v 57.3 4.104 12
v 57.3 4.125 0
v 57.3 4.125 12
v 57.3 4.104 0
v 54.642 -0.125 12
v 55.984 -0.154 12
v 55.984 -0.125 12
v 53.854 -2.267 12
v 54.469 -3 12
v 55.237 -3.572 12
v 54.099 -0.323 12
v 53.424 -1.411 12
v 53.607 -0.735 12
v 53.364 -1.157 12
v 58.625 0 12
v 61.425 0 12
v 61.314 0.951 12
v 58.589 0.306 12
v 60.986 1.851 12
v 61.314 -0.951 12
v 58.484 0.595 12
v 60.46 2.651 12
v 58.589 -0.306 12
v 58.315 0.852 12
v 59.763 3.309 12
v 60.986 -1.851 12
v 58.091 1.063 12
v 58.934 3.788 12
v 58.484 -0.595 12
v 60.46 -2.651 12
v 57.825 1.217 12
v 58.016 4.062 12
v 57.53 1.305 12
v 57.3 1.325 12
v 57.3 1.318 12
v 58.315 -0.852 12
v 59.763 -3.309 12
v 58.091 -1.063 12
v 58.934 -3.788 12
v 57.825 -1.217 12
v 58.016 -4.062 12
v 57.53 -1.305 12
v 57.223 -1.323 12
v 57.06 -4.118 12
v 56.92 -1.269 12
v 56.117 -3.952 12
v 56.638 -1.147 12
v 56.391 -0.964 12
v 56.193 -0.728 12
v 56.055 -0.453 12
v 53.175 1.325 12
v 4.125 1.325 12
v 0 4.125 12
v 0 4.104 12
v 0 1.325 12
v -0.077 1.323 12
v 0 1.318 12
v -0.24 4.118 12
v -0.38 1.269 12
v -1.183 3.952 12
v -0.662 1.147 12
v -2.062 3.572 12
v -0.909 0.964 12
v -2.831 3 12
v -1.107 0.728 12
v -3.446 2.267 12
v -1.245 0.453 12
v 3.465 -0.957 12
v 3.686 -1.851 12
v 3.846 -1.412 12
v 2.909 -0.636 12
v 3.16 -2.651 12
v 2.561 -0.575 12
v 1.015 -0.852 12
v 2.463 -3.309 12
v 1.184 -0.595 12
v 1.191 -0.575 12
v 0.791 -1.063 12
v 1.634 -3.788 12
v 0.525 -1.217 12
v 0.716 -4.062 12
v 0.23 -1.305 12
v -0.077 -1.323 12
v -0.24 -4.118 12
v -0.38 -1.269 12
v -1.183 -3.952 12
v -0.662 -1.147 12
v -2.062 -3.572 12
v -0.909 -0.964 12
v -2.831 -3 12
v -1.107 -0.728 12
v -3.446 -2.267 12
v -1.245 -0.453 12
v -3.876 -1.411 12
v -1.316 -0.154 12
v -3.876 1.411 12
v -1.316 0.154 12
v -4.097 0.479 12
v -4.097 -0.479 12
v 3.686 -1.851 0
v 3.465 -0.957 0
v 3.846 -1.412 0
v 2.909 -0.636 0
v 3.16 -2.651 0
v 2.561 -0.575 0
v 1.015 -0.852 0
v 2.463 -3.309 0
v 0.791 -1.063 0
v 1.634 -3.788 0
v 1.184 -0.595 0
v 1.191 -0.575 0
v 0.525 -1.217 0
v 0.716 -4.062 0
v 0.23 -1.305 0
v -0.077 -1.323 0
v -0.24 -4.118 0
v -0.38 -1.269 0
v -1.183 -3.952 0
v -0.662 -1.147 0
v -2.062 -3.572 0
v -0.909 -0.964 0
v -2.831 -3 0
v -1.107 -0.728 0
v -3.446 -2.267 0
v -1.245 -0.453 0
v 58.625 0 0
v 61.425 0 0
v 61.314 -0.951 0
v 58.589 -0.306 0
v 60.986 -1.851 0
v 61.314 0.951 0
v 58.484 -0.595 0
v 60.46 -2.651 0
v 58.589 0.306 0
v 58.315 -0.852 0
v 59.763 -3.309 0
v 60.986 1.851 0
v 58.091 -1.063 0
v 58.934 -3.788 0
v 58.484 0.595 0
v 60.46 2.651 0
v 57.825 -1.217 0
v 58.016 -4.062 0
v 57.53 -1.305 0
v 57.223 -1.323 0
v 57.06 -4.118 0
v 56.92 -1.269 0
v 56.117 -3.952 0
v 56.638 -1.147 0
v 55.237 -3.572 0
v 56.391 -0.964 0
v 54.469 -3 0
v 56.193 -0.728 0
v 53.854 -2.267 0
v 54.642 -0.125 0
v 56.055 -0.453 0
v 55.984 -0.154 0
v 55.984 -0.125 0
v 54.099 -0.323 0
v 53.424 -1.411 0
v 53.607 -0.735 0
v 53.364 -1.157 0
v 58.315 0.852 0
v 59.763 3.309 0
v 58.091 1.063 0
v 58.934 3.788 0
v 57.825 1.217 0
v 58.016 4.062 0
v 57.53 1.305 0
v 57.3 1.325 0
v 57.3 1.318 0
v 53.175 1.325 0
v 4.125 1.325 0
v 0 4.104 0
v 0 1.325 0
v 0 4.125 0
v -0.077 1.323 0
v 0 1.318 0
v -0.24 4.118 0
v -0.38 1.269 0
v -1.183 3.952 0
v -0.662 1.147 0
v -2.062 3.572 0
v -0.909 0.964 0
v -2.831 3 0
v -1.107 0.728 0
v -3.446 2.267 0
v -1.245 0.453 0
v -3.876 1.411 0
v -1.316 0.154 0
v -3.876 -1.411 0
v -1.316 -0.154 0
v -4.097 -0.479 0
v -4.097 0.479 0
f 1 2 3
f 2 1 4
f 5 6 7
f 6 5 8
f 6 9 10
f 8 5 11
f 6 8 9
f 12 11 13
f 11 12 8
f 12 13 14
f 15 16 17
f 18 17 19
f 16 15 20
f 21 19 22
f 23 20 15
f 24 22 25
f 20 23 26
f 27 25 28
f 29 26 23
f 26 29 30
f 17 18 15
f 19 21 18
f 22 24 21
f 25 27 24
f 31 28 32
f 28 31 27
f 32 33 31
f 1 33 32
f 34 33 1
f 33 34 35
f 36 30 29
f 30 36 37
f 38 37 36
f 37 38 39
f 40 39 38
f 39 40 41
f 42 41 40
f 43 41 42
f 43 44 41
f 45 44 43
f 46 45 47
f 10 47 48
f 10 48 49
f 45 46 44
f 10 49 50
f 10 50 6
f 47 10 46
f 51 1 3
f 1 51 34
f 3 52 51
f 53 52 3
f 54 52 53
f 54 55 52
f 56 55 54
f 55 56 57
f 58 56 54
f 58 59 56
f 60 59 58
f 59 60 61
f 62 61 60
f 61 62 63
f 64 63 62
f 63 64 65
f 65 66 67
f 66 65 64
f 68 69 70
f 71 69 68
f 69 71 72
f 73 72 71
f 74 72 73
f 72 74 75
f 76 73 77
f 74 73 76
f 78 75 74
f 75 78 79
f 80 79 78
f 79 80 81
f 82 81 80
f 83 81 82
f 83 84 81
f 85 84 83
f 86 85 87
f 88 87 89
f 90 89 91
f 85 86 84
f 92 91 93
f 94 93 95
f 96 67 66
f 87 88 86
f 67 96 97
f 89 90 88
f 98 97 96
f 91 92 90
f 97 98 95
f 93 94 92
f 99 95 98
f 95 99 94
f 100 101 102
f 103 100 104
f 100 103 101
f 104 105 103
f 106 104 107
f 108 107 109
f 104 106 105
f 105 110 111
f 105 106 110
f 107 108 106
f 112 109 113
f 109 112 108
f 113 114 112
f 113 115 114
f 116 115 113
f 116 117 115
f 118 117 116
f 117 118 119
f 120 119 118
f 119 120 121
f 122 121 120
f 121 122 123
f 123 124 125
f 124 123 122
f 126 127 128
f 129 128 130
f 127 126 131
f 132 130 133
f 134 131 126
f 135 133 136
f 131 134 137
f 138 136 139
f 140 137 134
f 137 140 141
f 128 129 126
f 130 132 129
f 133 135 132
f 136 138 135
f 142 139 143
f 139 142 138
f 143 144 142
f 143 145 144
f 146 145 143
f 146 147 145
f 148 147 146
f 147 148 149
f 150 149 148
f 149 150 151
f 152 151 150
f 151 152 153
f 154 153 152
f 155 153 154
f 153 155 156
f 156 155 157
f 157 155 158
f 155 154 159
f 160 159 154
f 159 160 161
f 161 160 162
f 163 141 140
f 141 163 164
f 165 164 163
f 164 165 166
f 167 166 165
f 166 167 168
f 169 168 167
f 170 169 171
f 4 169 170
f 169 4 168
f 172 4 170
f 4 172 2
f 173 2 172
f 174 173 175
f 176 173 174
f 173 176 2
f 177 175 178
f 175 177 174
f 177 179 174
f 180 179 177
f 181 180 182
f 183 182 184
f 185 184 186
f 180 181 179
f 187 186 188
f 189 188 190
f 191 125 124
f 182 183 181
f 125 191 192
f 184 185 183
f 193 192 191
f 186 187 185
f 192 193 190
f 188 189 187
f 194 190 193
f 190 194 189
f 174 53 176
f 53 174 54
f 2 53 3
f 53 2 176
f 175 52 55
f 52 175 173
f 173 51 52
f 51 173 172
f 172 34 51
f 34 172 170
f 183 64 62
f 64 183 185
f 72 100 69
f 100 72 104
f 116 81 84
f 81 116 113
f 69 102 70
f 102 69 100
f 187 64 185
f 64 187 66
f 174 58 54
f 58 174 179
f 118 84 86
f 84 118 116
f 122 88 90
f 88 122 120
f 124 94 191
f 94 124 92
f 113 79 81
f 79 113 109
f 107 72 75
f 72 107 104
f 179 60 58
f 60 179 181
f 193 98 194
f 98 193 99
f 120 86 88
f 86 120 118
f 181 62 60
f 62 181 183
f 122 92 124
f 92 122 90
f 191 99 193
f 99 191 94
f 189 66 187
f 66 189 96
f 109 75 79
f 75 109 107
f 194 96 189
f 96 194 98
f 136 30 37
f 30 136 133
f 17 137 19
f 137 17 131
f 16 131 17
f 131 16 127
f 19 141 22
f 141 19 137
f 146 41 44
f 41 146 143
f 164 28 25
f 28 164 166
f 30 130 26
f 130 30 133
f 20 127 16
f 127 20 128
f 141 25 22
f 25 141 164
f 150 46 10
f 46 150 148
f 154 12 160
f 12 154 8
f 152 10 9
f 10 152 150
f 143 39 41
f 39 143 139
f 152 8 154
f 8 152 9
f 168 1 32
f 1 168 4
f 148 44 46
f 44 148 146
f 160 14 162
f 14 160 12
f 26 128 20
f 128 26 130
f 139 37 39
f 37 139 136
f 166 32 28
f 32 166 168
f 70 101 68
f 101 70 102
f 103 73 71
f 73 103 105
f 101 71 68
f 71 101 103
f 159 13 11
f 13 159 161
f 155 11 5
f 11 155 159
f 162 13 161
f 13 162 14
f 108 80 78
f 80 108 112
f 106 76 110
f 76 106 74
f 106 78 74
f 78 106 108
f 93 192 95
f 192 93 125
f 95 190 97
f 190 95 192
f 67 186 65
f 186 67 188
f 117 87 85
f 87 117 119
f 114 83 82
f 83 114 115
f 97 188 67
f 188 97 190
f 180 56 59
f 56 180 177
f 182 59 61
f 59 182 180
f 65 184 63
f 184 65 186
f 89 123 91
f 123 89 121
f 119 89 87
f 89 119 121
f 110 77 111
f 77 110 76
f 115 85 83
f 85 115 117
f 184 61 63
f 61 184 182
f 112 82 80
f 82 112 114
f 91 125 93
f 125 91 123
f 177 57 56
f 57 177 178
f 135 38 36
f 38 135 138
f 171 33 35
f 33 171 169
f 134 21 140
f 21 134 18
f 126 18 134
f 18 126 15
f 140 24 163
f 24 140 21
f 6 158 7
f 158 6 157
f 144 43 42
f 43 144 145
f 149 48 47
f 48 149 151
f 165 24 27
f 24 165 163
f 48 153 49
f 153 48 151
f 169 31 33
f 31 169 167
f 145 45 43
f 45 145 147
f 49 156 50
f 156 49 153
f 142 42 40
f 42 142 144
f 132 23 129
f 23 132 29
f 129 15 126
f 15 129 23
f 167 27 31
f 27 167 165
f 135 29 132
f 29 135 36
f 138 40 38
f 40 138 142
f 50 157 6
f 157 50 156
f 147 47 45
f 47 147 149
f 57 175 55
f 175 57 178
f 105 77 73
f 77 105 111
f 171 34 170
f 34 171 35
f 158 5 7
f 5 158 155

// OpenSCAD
// Distance between wires (perimeter-to-perimeter) in folded position
length = 60;
// Clip overall thickness (choose based on extrusion width; mine is 0.42 and with 2.8 Slic3r produces exactly 3+3 walls total thickness with no infill)
thickness = 2.8;

/* [Wire] */
// Diameter of wire
diameter = 2.7;
// Clip lip vertical thickness (larger makes clip harder to insert/remove; must be smaller than wire diameter, recommended setting just under diameter/4)
first_lip = 0.75;
// Clip lip vertical thickness (larger makes clip harder to insert/remove; must be smaller than wire diameter, recommended setting just under diameter/2)
second_lip = 1.2;

/* [Hidden] */

ir = (diameter - .05)/2;
thk = thickness;
l = length - diameter;
w = 12;

slack1 = first_lip;
slack2 = second_lip;

$fn = 27;

module fillet(h, r) {
  difference() {
    cube([h, r, r]);
    translate([-0.1, r, r]) rotate([0, 90, 0]) cylinder(h = h+.2, r = r, $fn=18);
  }
}

module main() {
  difference() {
    union() {
      translate([0, ir, 0]) cube([l, thk, w]);
      cylinder(r=ir+thk, h=w);
      translate([l, 0, 0]) cylinder(r=ir+thk, h=w);
    }
    translate([0, 0, -1]) cylinder(r=ir, h=w+2);
    translate([l, 0, -1]) cylinder(r=ir, h=w+2);
    translate([0, -ir+slack1, -1]) cube([ir+thk, 2*ir-slack1, w+2]);
    translate([l-ir-thk, -ir+slack2, -1]) cube([ir+thk, 2*ir-slack2, w+2]);
    translate([ir+thk, -ir+slack1+0.05, -1]) rotate([0, -90, 90]) fillet(r=0.66*thk, h=w+2);
    translate([l-ir-thk, -ir+slack2+0.05, -1]) rotate([0, -90, 180]) fillet(r=0.66*thk, h=w+2);
  }
}

main();
